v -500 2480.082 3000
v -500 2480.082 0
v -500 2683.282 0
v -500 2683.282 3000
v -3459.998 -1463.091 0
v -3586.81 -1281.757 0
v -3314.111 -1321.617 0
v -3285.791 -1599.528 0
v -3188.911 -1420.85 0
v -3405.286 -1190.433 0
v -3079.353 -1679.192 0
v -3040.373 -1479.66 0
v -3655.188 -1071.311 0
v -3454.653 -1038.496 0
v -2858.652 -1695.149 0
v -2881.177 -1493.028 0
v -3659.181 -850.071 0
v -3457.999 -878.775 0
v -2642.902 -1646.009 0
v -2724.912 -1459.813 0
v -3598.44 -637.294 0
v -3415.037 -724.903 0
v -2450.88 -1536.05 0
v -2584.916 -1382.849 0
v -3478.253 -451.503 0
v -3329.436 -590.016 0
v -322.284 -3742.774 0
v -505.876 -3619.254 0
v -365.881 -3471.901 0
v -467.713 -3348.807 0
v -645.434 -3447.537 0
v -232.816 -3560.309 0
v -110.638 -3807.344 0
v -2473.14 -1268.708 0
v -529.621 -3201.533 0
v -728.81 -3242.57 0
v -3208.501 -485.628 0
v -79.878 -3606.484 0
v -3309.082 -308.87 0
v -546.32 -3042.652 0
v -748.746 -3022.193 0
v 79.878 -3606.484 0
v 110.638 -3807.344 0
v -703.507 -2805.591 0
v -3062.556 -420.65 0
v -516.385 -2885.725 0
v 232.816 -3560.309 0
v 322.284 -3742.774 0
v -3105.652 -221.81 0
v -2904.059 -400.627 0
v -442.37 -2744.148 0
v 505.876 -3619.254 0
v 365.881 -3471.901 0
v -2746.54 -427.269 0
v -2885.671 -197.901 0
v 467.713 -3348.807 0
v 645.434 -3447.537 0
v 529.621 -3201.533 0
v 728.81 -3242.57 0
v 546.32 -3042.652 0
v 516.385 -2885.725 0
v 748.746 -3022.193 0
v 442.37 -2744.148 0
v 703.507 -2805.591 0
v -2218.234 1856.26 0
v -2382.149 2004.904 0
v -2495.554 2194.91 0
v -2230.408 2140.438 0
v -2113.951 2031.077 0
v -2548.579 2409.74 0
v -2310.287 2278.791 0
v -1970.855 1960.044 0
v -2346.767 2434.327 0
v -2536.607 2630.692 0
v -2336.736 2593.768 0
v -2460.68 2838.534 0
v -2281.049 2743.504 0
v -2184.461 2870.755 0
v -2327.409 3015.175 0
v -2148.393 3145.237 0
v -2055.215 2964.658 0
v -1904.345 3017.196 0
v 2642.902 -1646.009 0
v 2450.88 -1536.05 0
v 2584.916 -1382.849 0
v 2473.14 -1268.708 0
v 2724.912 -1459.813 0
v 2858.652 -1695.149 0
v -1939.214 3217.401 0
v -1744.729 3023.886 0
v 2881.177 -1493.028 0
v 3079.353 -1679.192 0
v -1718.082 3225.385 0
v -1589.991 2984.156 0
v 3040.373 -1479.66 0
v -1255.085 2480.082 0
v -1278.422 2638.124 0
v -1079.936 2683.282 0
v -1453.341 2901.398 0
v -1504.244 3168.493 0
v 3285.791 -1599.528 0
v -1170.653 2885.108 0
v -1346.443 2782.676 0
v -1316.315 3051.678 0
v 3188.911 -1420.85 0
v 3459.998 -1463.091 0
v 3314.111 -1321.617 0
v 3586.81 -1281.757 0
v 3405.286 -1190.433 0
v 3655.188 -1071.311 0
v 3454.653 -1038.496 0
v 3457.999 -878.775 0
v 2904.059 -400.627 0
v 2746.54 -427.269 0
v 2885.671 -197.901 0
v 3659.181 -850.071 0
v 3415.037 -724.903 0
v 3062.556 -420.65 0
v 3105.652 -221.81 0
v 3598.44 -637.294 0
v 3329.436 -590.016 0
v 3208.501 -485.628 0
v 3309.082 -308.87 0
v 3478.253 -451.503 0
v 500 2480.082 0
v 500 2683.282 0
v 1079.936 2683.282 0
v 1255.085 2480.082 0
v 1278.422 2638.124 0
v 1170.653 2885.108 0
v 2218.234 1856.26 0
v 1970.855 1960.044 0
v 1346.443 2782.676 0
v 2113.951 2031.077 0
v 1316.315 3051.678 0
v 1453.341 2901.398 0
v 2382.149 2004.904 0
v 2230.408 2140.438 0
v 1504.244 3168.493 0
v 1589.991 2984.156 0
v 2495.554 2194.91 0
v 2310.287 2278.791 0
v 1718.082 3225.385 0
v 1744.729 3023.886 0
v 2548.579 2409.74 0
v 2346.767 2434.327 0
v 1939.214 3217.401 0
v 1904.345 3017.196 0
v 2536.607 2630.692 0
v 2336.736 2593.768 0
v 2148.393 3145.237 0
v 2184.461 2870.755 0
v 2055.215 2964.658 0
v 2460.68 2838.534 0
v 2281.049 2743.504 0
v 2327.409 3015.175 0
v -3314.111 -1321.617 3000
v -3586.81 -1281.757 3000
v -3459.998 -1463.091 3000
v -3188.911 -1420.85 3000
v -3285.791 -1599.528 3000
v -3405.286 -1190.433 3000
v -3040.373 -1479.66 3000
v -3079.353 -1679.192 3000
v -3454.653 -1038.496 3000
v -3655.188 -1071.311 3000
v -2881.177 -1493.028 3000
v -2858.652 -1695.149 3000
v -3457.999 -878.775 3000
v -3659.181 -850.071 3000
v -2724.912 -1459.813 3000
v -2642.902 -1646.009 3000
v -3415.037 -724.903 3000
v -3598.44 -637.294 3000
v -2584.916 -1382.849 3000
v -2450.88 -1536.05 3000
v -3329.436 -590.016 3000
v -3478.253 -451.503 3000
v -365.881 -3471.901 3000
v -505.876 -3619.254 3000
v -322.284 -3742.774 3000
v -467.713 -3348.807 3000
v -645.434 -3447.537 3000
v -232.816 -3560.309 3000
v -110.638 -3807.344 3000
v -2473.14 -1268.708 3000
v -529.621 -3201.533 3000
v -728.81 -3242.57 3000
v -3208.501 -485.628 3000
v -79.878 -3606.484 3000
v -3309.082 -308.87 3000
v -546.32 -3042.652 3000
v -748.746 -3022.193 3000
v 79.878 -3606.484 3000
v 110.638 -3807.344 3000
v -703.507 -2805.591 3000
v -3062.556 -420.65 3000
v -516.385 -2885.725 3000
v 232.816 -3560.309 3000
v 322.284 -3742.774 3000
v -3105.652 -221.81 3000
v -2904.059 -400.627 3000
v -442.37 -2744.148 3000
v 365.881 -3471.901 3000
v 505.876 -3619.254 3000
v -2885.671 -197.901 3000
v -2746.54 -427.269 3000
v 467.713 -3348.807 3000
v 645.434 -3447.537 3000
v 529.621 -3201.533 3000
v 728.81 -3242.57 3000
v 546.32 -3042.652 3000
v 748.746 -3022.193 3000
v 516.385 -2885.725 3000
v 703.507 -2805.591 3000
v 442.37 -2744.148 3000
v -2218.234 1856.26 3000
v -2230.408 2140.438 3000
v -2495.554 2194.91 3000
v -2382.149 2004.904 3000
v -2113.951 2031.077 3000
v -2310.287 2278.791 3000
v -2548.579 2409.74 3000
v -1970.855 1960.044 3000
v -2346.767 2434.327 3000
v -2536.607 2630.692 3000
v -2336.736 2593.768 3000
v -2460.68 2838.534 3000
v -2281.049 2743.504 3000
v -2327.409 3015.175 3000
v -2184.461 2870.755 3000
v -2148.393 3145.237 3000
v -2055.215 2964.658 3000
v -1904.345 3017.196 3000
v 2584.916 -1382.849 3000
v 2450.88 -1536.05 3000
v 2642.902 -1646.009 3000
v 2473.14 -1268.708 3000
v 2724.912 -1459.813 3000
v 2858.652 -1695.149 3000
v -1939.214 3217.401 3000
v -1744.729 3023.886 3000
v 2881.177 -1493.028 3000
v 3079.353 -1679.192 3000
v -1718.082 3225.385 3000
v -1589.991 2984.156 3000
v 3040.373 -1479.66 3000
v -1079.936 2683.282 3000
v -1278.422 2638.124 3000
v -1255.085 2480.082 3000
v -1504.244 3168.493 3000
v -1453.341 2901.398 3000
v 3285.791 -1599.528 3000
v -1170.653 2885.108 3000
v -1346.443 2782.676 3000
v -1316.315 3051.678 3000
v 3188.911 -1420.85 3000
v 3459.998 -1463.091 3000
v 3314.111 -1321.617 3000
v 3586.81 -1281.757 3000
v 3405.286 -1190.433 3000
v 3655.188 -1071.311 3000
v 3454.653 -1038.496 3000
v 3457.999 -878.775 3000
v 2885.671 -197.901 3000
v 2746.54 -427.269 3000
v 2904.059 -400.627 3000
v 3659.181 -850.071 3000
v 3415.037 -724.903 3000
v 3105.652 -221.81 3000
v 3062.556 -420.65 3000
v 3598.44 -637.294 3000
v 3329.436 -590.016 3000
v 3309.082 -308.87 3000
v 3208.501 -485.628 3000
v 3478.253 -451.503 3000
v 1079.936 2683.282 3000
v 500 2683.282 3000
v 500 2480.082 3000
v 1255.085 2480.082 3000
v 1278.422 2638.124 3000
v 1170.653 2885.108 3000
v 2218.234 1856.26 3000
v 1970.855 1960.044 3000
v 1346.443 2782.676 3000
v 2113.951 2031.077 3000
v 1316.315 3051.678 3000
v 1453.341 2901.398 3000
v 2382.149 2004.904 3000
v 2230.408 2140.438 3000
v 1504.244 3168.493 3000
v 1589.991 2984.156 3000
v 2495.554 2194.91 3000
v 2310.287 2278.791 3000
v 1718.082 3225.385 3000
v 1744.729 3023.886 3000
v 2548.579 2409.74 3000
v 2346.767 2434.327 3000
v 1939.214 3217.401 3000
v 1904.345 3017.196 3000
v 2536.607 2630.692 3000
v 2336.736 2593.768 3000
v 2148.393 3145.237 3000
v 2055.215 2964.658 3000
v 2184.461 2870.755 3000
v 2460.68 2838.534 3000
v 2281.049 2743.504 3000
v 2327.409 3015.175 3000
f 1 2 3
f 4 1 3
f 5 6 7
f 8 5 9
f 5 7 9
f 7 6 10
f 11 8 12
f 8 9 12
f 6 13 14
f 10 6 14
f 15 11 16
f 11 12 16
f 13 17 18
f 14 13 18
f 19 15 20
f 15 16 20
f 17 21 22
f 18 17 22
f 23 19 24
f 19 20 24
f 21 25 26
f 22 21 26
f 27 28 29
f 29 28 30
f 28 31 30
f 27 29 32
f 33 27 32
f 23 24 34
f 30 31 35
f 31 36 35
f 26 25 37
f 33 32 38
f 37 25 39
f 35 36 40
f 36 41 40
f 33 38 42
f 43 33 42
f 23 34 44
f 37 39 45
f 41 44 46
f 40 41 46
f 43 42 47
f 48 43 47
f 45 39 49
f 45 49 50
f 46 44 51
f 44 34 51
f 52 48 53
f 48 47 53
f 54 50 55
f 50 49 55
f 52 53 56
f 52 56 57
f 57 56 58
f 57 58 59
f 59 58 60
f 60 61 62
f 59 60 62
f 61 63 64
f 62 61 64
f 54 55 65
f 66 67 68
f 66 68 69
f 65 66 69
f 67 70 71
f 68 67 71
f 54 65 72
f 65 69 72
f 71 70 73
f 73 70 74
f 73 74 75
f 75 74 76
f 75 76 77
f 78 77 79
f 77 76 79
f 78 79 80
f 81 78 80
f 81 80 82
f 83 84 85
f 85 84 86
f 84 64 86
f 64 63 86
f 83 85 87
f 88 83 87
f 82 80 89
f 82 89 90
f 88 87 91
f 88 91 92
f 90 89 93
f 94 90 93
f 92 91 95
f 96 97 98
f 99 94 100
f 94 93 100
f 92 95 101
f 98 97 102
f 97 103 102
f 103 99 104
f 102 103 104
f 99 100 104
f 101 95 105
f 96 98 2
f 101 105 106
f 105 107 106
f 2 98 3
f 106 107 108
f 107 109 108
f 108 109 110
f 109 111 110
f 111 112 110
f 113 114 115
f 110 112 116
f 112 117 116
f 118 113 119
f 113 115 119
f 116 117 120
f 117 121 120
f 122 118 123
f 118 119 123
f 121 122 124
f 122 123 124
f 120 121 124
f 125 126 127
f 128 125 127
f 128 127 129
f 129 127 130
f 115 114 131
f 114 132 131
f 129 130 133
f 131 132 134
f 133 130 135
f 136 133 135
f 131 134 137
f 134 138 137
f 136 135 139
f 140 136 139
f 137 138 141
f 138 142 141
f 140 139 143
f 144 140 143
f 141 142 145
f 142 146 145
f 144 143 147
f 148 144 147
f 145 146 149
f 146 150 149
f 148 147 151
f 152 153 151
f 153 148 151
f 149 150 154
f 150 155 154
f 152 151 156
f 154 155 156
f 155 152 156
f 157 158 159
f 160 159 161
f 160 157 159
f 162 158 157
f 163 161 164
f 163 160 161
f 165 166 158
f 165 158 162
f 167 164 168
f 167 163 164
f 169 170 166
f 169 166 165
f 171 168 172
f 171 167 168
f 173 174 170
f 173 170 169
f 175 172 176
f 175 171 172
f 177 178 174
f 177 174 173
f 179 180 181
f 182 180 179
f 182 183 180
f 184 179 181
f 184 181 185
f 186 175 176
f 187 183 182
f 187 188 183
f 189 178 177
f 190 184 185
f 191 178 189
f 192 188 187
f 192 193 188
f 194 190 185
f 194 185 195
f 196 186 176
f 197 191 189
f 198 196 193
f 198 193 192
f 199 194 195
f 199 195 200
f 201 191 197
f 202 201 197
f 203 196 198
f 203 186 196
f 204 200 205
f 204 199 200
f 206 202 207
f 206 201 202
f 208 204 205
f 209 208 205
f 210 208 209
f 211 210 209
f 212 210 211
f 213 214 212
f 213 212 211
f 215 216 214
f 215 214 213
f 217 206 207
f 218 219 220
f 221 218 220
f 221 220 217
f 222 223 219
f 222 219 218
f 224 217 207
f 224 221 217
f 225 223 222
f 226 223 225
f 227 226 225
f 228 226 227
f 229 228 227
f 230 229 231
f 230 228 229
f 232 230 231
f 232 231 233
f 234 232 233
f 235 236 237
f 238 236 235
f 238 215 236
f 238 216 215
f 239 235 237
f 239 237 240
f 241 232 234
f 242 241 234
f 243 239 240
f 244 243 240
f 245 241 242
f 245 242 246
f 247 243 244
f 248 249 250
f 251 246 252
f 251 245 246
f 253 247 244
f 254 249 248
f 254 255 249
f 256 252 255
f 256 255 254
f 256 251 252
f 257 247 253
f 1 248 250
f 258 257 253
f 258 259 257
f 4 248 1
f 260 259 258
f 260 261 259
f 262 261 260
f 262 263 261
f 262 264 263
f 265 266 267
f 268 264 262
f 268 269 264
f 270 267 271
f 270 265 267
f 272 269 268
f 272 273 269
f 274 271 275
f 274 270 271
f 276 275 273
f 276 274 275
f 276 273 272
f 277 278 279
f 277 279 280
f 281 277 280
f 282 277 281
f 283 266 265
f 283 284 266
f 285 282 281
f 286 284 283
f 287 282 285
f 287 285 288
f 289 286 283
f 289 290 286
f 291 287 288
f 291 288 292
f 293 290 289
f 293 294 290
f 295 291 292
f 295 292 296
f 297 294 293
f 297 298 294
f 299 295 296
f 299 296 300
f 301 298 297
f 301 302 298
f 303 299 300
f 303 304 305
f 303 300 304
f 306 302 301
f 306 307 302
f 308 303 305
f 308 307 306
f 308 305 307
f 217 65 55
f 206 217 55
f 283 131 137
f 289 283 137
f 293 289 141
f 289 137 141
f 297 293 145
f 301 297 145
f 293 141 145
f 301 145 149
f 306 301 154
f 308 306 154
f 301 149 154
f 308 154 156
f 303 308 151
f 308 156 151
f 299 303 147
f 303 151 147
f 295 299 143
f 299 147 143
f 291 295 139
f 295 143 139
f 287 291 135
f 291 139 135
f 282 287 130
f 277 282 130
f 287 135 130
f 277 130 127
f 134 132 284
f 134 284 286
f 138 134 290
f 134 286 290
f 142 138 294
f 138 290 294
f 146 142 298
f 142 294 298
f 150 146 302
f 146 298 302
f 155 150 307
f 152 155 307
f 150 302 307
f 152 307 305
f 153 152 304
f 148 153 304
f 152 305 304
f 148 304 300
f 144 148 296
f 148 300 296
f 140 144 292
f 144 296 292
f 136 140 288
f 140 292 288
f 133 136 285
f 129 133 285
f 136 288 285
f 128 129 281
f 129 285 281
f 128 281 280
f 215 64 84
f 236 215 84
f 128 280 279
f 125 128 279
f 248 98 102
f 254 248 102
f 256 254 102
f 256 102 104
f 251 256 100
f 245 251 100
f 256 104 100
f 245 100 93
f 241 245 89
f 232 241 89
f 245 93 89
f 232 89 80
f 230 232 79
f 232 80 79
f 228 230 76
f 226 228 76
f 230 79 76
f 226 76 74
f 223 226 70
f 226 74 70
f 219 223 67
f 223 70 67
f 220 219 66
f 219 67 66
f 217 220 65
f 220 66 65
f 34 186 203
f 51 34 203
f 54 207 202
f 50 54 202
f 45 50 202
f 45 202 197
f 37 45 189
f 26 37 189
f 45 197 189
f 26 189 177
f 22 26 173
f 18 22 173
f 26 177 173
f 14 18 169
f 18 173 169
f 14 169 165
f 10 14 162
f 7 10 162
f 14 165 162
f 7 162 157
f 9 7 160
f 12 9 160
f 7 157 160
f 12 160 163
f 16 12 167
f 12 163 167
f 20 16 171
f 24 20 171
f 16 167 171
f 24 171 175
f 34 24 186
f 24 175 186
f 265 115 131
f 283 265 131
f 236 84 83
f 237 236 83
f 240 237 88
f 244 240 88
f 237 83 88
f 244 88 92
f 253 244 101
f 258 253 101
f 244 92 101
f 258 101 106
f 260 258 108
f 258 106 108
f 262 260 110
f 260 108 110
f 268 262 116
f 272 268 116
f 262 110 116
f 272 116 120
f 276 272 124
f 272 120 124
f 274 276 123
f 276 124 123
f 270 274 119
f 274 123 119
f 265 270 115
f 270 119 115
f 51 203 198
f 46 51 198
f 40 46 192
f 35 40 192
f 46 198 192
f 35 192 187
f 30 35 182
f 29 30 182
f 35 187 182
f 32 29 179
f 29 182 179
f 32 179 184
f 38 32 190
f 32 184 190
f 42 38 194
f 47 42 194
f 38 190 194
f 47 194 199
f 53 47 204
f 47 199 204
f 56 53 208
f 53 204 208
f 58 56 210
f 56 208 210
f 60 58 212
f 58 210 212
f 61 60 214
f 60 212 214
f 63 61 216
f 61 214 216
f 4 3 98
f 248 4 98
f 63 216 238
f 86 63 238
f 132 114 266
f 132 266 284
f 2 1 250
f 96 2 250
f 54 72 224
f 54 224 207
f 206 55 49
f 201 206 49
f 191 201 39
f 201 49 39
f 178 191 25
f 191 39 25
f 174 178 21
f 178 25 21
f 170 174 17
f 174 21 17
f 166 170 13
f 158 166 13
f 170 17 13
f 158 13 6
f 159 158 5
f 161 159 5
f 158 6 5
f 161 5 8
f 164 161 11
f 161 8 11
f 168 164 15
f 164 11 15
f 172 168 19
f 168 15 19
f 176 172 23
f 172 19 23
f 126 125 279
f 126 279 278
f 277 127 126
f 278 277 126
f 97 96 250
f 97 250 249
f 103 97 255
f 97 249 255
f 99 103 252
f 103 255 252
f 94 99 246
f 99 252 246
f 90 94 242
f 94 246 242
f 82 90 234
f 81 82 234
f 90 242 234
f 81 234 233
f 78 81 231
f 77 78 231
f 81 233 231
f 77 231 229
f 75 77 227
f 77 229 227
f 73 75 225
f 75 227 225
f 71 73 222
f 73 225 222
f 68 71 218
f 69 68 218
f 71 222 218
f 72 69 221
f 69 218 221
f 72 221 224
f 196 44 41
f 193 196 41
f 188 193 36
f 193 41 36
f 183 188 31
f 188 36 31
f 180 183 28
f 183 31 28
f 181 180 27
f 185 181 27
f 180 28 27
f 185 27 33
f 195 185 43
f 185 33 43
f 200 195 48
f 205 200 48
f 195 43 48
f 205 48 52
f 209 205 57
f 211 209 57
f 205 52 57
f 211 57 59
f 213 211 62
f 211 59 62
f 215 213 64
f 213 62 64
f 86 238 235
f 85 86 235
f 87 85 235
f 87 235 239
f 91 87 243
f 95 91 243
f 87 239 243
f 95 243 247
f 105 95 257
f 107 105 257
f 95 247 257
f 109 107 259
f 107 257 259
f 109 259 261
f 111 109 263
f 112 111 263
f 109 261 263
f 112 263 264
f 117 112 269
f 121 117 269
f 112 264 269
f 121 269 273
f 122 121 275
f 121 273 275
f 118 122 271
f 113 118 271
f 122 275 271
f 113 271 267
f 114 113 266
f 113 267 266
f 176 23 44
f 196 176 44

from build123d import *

# Parameters (mm, degrees)
F1_DEPTH = 3000
F2_W     = 1000
F2_H     = 203.2
F3_DEPTH = 3000


with BuildPart() as f1:
    # F0 (on Top) → F1 (new body)
    with BuildSketch(Plane.XY):
        with BuildLine():
            Line((1079.9361502798, 2683.2815729997), (-1079.9361502798, 2683.2815729997))
            ThreePointArc((-1079.9361502798, 2683.2815729997), (-1058.9306862965, 2582.6451165466), (-1051.8847357067, 2480.0815729997))
            ThreePointArc((-1051.8847357067, 2480.0815729997), (-1448.1629520651, 1818.7337826675), (-2218.2338017798, 1856.2599196563))
            Line((-2218.2338017798, 1856.2599196563), (-2885.6710483324, -197.9007061562))
            ThreePointArc((-2885.6710483324, -197.9007061562), (-2374.7336324903, -427.6337829065), (-2165.5107461831, -947.3068660136))
            ThreePointArc((-2165.5107461831, -947.3068660136), (-2240.6133341429, -1274.4360197456), (-2450.8800347736, -1536.049850698))
            Line((-2450.8800347736, -1536.049850698), (-703.5066379412, -2805.5909358019))
            ThreePointArc((-703.5066379412, -2805.5909358019), (0, -2315.5494139723), (703.5066379412, -2805.5909358019))
            Line((703.5066379412, -2805.5909358019), (2450.8800347736, -1536.049850698))
            ThreePointArc((2450.8800347736, -1536.049850698), (2202.2183589618, -715.5441202324), (2885.6710483324, -197.9007061562))
            Line((2885.6710483324, -197.9007061562), (2218.2338017798, 1856.2599196563))
            ThreePointArc((2218.2338017798, 1856.2599196563), (1361.0457964874, 1873.3188272185), (1079.9361502798, 2683.2815729998))
        make_face()
        with BuildLine():
            Line((0, -3316.7184270003), (-703.5066379412, -2805.5909358019))
            ThreePointArc((-703.5066379412, -2805.5909358019), (-132.0417008829, -3803.8345819311), (750, -3065.5494139723))
            ThreePointArc((750, -3065.5494139723), (738.2851679588, -2933.5077130894), (703.5066379412, -2805.5909358019))
            Line((703.5066379412, -2805.5909358019), (0, -3316.7184270003))
        make_face()
        with BuildLine():
            Line((-3154.3866727148, -1024.9223594996), (-2885.6710483324, -197.9007061562))
            ThreePointArc((-2885.6710483324, -197.9007061562), (-3628.8031334045, -1179.0696117948), (-2450.8800347736, -1536.049850698))
            Line((-2450.8800347736, -1536.049850698), (-3154.3866727148, -1024.9223594996))
        make_face()
        with BuildLine():
            ThreePointArc((-2165.5107461831, -947.3068660136), (-2374.7336324903, -427.6337829065), (-2885.6710483324, -197.9007061562))
            Line((-2885.6710483324, -197.9007061562), (-3154.3866727148, -1024.9223594996))
            Line((-3154.3866727148, -1024.9223594996), (-2450.8800347736, -1536.049850698))
            ThreePointArc((-2450.8800347736, -1536.049850698), (-2240.6133341429, -1274.4360197456), (-2165.5107461831, -947.3068660136))
        make_face()
        with BuildLine():
            Line((-1079.9361502798, 2683.2815729997), (-1949.5181773974, 2683.2815729997))
            Line((-1949.5181773974, 2683.2815729997), (-2218.2338017798, 1856.2599196563))
            ThreePointArc((-2218.2338017798, 1856.2599196563), (-1448.1629520651, 1818.7337826675), (-1051.8847357067, 2480.0815729997))
            ThreePointArc((-1051.8847357067, 2480.0815729997), (-1058.9306862965, 2582.6451165466), (-1079.9361502798, 2683.2815729997))
        make_face()
        with BuildLine():
            Line((-2218.2338017798, 1856.2599196563), (-1949.5181773974, 2683.2815729997))
            Line((-1949.5181773974, 2683.2815729997), (-1079.9361502798, 2683.2815729997))
            ThreePointArc((-1079.9361502798, 2683.2815729997), (-2242.7236749261, 3086.844318781), (-2218.2338017798, 1856.2599196563))
        make_face()
        with BuildLine():
            Line((1949.5181773974, 2683.2815729997), (1079.9361502798, 2683.2815729997))
            ThreePointArc((1079.9361502798, 2683.2815729998), (1361.0457964874, 1873.3188272185), (2218.2338017798, 1856.2599196563))
            Line((2218.2338017798, 1856.2599196563), (1949.5181773974, 2683.2815729997))
        make_face()
        with BuildLine():
            ThreePointArc((2551.8847357067, 2480.0815729997), (1904.4482792536, 3223.03562241), (1079.9361502798, 2683.2815729998))
            Line((1079.9361502798, 2683.2815729997), (1949.5181773974, 2683.2815729997))
            Line((1949.5181773974, 2683.2815729997), (2218.2338017798, 1856.2599196563))
            ThreePointArc((2218.2338017798, 1856.2599196563), (2463.232526039, 2126.3597893581), (2551.8847357067, 2480.0815729997))
        make_face()
        with BuildLine():
            Line((3154.3866727148, -1024.9223594996), (2885.6710483324, -197.9007061562))
            ThreePointArc((2885.6710483324, -197.9007061562), (2202.2183589618, -715.5441202324), (2450.8800347736, -1536.049850698))
            Line((2450.8800347736, -1536.049850698), (3154.3866727148, -1024.9223594996))
        make_face()
        with BuildLine():
            ThreePointArc((3665.5107461831, -947.3068660136), (3435.1838292902, -406.5297523207), (2885.6710483324, -197.9007061562))
            Line((2885.6710483324, -197.9007061562), (3154.3866727148, -1024.9223594996))
            Line((3154.3866727148, -1024.9223594996), (2450.8800347736, -1536.049850698))
            ThreePointArc((2450.8800347736, -1536.049850698), (3242.6398999152, -1622.2042780538), (3665.5107461831, -947.3068660136))
        make_face()
        with BuildLine():
            ThreePointArc((703.5066379412, -2805.5909358019), (0, -2315.5494139723), (-703.5066379412, -2805.5909358019))
            Line((-703.5066379412, -2805.5909358019), (0, -3316.7184270003))
            Line((0, -3316.7184270003), (703.5066379412, -2805.5909358019))
        make_face()
    extrude(amount=F1_DEPTH)

    # F2 (on face) → F3 (cut)
    with BuildSketch(Plane.XY.offset(3000)):
        with BuildLine():
            Line((500, 2480.0815729997), (-500, 2480.0815729997))
            Line((-500, 2480.0815729997), (-1255.0847357067, 2480.0815729997))
            ThreePointArc((-1255.0847357067, 2480.0815729997), (-2123.2857116603, 2922.452065524), (-1970.855228231, 1960.0438698896))
            Line((-1970.855228231, 1960.0438698896), (-2746.5402536589, -427.2691629034))
            ThreePointArc((-2746.5402536589, -427.2691629034), (-3435.5484492933, -1116.2773585378), (-2473.1402536589, -1268.7078419671))
            Line((-2473.1402536589, -1268.7078419671), (-442.3704925242, -2744.1484380188))
            ThreePointArc((-442.3704925242, -2744.1484380188), (0, -3612.3494139723), (442.3704925242, -2744.1484380188))
            Line((442.3704925242, -2744.1484380188), (2473.1402536589, -1268.7078419671))
            ThreePointArc((2473.1402536589, -1268.7078419671), (3435.5484492933, -1116.2773585378), (2746.5402536589, -427.2691629034))
            Line((2746.5402536589, -427.2691629034), (1970.855228231, 1960.0438698896))
            ThreePointArc((1970.855228231, 1960.0438698896), (2123.2857116603, 2922.452065524), (1255.0847357067, 2480.0815729997))
            Line((1255.0847357067, 2480.0815729997), (500, 2480.0815729997))
        make_face()
        with Locations((0, 2581.6815729997)):
            Rectangle(F2_W, F2_H)
    extrude(amount=-F3_DEPTH, mode=Mode.SUBTRACT)


solid = f1.part
